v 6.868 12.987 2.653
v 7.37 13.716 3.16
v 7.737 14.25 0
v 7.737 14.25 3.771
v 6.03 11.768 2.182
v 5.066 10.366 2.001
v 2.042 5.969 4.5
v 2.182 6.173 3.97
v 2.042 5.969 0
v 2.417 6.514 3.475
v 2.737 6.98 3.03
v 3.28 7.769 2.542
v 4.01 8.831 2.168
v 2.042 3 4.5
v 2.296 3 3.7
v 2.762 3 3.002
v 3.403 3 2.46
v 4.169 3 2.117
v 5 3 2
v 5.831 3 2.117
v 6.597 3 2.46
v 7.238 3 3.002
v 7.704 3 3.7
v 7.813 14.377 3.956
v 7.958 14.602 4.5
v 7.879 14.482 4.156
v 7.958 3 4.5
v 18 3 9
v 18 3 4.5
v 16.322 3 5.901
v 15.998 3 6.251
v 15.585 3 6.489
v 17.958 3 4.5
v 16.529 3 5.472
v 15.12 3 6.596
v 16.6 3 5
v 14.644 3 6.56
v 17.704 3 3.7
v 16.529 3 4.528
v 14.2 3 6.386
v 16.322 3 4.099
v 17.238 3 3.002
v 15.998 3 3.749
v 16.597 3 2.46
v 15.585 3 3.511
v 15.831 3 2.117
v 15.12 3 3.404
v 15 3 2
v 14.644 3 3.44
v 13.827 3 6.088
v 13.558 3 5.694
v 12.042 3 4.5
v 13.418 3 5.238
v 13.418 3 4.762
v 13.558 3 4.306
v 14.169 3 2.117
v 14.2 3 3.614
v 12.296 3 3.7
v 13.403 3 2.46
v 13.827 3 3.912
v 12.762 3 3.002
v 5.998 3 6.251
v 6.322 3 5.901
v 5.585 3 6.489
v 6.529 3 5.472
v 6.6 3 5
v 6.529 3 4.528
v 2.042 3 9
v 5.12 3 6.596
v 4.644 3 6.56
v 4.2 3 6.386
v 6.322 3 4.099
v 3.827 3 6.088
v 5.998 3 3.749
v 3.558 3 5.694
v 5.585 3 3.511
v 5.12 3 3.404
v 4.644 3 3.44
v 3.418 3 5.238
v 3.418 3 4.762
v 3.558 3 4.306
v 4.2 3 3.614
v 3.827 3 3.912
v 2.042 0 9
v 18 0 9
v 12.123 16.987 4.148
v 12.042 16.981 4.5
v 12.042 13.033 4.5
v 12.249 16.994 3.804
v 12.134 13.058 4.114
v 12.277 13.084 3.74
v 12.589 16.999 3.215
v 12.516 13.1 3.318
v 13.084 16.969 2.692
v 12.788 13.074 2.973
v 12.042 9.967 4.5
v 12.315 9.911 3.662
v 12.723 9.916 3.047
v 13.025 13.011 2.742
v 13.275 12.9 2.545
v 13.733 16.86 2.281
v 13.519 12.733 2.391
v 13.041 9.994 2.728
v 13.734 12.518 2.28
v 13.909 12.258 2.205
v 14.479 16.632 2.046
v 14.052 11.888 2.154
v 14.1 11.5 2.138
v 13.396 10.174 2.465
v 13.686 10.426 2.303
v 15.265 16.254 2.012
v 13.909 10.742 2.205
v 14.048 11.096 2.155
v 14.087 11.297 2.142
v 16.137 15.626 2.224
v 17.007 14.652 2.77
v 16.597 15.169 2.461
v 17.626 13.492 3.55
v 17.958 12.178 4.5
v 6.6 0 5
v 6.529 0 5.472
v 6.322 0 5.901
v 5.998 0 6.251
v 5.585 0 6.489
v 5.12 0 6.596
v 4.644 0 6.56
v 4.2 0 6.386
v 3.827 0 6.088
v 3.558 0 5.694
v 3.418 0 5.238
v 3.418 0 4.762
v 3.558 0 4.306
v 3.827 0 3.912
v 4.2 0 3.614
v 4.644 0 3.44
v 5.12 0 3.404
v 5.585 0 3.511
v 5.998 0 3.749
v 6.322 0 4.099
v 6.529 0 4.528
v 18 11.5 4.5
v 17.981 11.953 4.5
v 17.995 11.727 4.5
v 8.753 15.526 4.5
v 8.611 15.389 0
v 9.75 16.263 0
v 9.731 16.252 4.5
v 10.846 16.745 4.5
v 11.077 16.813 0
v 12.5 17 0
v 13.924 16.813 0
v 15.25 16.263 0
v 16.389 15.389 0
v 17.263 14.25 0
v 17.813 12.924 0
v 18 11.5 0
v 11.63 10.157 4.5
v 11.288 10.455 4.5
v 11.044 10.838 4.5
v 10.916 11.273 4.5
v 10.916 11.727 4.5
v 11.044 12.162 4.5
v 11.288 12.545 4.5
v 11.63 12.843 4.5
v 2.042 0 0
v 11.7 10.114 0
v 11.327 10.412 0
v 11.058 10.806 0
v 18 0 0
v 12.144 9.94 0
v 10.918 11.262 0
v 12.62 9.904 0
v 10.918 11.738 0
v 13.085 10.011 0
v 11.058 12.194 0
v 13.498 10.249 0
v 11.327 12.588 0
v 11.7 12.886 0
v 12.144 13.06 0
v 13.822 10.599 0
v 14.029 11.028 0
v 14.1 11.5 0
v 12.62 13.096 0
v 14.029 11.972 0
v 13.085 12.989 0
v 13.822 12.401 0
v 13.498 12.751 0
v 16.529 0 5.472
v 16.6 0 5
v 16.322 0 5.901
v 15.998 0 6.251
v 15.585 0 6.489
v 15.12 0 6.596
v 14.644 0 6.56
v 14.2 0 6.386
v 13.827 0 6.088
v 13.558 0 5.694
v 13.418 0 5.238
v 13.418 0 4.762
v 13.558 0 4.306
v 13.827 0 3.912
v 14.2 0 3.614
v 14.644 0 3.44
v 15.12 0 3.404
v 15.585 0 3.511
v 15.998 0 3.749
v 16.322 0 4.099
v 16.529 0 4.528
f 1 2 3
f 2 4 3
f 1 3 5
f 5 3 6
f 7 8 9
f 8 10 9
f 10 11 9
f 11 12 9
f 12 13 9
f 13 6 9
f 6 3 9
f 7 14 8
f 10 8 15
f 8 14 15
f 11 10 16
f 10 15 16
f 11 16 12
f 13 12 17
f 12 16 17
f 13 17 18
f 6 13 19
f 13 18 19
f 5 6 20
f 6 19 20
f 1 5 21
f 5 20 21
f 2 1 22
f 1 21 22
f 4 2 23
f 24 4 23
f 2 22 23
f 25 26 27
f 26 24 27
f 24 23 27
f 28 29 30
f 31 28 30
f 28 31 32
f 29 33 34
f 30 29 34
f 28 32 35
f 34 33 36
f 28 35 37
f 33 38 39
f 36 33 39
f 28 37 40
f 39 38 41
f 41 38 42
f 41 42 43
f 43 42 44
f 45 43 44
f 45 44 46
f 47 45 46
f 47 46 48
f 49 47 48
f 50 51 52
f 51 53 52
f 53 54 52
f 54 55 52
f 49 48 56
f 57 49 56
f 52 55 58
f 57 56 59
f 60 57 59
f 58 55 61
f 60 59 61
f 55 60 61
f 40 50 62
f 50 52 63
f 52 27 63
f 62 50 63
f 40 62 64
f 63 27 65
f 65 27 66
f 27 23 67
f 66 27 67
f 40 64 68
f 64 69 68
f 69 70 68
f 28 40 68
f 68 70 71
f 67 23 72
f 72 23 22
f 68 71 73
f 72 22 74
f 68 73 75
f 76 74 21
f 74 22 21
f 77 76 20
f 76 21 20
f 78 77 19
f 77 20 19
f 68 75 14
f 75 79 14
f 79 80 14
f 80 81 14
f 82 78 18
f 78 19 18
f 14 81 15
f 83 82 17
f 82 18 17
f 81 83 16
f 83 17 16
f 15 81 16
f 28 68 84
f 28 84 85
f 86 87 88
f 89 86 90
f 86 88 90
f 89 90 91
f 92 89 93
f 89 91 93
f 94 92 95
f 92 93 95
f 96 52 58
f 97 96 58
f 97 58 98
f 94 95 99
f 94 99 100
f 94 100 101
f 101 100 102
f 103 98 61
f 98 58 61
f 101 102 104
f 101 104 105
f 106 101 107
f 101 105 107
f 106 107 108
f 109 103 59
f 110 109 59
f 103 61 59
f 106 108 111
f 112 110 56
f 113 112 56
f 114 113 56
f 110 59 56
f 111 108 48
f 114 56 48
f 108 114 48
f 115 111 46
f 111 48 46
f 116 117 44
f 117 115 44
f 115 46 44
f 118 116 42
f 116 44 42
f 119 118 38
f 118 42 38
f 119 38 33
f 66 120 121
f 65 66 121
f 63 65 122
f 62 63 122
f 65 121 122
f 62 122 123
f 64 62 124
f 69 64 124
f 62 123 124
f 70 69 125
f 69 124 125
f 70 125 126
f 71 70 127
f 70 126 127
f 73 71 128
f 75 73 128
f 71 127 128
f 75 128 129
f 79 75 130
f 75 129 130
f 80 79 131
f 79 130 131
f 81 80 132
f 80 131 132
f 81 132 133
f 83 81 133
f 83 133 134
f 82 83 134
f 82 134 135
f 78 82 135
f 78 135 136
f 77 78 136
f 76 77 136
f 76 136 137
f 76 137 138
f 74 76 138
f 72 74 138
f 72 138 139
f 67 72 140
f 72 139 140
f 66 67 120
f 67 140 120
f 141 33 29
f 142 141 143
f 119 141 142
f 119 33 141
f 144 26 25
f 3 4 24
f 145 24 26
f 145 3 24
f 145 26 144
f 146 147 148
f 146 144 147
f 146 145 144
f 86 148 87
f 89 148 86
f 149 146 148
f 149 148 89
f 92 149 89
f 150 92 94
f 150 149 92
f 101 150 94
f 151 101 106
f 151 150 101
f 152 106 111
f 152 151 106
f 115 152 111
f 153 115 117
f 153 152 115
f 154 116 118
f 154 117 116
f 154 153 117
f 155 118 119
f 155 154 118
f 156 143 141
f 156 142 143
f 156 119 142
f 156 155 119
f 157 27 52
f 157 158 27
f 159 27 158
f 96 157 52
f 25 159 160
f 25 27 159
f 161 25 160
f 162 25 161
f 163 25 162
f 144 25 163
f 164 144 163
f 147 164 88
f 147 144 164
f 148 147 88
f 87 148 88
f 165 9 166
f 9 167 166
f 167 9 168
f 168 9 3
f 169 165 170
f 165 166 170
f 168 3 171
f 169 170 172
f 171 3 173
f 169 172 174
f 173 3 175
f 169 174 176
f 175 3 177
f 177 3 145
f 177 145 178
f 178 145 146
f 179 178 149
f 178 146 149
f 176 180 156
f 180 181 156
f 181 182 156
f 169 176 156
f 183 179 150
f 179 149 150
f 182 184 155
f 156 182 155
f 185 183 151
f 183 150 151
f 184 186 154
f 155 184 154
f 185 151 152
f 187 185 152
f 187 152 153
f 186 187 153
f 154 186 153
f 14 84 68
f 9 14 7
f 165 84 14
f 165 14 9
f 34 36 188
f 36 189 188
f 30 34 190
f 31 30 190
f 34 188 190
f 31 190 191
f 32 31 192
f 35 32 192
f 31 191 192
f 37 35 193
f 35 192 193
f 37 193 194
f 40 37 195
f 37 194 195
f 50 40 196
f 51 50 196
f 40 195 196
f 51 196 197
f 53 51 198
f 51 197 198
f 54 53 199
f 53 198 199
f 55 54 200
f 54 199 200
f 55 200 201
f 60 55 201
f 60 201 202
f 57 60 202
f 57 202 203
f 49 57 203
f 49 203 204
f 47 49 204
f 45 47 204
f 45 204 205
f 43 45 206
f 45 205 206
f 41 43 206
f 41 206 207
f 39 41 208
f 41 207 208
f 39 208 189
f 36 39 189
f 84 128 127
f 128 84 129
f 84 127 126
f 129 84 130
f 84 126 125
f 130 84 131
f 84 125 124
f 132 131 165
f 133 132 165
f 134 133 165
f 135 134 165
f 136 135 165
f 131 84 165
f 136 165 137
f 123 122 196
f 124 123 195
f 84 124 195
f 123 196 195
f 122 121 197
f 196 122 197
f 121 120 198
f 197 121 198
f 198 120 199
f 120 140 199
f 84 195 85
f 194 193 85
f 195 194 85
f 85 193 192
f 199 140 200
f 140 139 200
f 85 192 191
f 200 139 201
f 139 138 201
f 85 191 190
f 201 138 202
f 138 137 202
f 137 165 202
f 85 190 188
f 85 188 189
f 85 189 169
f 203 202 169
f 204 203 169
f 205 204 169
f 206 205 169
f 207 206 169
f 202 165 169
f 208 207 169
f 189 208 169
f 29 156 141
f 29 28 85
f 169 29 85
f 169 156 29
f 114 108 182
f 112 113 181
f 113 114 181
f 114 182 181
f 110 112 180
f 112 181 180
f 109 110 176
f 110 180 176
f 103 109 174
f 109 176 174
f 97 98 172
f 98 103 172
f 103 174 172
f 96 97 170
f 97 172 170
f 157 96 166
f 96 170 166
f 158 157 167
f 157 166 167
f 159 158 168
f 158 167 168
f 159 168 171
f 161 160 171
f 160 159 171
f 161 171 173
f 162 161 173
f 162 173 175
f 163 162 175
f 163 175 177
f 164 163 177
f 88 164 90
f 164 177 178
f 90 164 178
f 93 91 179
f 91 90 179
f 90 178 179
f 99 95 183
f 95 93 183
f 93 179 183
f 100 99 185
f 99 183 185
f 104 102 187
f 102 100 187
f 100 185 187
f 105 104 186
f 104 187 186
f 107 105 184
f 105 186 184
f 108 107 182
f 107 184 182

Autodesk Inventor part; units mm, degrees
ref_plane "YZ Plane" through (0, 0, 0) normal (1, 0, 0) x (0, 1, 0)
ref_plane "XZ Plane" through (0, 0, 0) normal (0, 1, 0) x (-1, 0, 0)
ref_plane "XY Plane" through (0, 0, 0) normal (0, 0, 1) x (1, 0, 0)
sketch "Sketch1" plane through (0, 0, 0) normal (0, 0, 1) x (1, 0, 0)
  circle A0 centre (12.5, 11.5) radius 1.6
  line L0 (0, 0) -> (18, 0)
  line L1 (0, 0) -> (0, 3)
  arc A1 (18, 11.5) -> (7.7369, 14.25) centre (12.5, 11.5) ccw
  line L2 (12.5, 11.5) -> (7.7369, 14.25) construction
  line L3 (12.5, 11.5) -> (18, 11.5) construction
  line L4 (7.7369, 14.25) -> (0, 3)
  line L5 (18, 11.5) -> (18, 0)
  dimension "d17" = 3
  dimension "d19" = 11.5
  dimension "d23" = 90
  dimension "d25" = 12.5
  dimension "d31" = 5.5
  dimension "d32" = 150
  dimension "d49" = 3.2
extrude "Extrusion1" add sketch "Sketch1" along normal blind 4.5
sketch "Sketch4" plane through (0, 0, 4.5) normal (0, 0, 1) x (1, 0, 0)
  line L0 (0, 3) -> (0, 0) projected
  line L1 (18, 0) -> (18, 3)
  line L2 (0, 0) -> (18, 0)
  line L3 (18, 0) -> (18, 3)
  line L4 (18, 3) -> (0, 3)
  line L5 (0, 3) -> (0, 0)
  line L6 (18, 0) -> (18, 11.5) projected
extrude "Extrusion2" add sketch "Sketch4" along normal blind 4.5
sketch "Sketch5" plane through (0, 0, 0) normal (0, -1, 0) x (1, 0, 0)
  circle A0 centre (5, 5) radius 1.6
  circle A1 centre (15, 5) radius 1.6
  line L0 (0, 0) -> (18, 0) projected
  point P0 (20.0001, 0)
  dimension "d13" = 3.2
  dimension "d14" = 3.2
  dimension "d38" = 5
  dimension "d39" = 5
extrude "Extrusion3" cut sketch "Sketch5" against normal through all
sketch "Sketch6" plane through (0, 3, 9) normal (0, 1, 0) x (1, 0, 0)
  circle A0 centre (5, 4) radius 1.6 projected
  circle A1 centre (5, 4) radius 3
  circle A2 centre (15, 4) radius 1.6 projected
  circle A3 centre (15, 4) radius 3
  line L0 (0, 9) -> (18, 9) projected
  point P0 (20.0001, 9)
  dimension "d34" = 6
  dimension "d35" = 6
  dimension "d40" = 5
  dimension "d41" = 5
extrude "Extrusion4" cut sketch "Sketch6" along normal up to next
sketch "Sketch7" plane through (0, 0, 0) normal (0, -1, 0) x (1, 0, 0)
  line L0 (0, 0) -> (0, 9) projected
  line L1 (2.042, 0) -> (0, 0)
  line L2 (0, 0) -> (0, 9)
  line L3 (0, 9) -> (2.042, 9)
  line L4 (2.042, 9) -> (2.042, 0)
extrude "Extrusion5" cut sketch "Sketch7" against normal up to next
properties part number "lower_deck_shaft_mount_v3_for_AD"
